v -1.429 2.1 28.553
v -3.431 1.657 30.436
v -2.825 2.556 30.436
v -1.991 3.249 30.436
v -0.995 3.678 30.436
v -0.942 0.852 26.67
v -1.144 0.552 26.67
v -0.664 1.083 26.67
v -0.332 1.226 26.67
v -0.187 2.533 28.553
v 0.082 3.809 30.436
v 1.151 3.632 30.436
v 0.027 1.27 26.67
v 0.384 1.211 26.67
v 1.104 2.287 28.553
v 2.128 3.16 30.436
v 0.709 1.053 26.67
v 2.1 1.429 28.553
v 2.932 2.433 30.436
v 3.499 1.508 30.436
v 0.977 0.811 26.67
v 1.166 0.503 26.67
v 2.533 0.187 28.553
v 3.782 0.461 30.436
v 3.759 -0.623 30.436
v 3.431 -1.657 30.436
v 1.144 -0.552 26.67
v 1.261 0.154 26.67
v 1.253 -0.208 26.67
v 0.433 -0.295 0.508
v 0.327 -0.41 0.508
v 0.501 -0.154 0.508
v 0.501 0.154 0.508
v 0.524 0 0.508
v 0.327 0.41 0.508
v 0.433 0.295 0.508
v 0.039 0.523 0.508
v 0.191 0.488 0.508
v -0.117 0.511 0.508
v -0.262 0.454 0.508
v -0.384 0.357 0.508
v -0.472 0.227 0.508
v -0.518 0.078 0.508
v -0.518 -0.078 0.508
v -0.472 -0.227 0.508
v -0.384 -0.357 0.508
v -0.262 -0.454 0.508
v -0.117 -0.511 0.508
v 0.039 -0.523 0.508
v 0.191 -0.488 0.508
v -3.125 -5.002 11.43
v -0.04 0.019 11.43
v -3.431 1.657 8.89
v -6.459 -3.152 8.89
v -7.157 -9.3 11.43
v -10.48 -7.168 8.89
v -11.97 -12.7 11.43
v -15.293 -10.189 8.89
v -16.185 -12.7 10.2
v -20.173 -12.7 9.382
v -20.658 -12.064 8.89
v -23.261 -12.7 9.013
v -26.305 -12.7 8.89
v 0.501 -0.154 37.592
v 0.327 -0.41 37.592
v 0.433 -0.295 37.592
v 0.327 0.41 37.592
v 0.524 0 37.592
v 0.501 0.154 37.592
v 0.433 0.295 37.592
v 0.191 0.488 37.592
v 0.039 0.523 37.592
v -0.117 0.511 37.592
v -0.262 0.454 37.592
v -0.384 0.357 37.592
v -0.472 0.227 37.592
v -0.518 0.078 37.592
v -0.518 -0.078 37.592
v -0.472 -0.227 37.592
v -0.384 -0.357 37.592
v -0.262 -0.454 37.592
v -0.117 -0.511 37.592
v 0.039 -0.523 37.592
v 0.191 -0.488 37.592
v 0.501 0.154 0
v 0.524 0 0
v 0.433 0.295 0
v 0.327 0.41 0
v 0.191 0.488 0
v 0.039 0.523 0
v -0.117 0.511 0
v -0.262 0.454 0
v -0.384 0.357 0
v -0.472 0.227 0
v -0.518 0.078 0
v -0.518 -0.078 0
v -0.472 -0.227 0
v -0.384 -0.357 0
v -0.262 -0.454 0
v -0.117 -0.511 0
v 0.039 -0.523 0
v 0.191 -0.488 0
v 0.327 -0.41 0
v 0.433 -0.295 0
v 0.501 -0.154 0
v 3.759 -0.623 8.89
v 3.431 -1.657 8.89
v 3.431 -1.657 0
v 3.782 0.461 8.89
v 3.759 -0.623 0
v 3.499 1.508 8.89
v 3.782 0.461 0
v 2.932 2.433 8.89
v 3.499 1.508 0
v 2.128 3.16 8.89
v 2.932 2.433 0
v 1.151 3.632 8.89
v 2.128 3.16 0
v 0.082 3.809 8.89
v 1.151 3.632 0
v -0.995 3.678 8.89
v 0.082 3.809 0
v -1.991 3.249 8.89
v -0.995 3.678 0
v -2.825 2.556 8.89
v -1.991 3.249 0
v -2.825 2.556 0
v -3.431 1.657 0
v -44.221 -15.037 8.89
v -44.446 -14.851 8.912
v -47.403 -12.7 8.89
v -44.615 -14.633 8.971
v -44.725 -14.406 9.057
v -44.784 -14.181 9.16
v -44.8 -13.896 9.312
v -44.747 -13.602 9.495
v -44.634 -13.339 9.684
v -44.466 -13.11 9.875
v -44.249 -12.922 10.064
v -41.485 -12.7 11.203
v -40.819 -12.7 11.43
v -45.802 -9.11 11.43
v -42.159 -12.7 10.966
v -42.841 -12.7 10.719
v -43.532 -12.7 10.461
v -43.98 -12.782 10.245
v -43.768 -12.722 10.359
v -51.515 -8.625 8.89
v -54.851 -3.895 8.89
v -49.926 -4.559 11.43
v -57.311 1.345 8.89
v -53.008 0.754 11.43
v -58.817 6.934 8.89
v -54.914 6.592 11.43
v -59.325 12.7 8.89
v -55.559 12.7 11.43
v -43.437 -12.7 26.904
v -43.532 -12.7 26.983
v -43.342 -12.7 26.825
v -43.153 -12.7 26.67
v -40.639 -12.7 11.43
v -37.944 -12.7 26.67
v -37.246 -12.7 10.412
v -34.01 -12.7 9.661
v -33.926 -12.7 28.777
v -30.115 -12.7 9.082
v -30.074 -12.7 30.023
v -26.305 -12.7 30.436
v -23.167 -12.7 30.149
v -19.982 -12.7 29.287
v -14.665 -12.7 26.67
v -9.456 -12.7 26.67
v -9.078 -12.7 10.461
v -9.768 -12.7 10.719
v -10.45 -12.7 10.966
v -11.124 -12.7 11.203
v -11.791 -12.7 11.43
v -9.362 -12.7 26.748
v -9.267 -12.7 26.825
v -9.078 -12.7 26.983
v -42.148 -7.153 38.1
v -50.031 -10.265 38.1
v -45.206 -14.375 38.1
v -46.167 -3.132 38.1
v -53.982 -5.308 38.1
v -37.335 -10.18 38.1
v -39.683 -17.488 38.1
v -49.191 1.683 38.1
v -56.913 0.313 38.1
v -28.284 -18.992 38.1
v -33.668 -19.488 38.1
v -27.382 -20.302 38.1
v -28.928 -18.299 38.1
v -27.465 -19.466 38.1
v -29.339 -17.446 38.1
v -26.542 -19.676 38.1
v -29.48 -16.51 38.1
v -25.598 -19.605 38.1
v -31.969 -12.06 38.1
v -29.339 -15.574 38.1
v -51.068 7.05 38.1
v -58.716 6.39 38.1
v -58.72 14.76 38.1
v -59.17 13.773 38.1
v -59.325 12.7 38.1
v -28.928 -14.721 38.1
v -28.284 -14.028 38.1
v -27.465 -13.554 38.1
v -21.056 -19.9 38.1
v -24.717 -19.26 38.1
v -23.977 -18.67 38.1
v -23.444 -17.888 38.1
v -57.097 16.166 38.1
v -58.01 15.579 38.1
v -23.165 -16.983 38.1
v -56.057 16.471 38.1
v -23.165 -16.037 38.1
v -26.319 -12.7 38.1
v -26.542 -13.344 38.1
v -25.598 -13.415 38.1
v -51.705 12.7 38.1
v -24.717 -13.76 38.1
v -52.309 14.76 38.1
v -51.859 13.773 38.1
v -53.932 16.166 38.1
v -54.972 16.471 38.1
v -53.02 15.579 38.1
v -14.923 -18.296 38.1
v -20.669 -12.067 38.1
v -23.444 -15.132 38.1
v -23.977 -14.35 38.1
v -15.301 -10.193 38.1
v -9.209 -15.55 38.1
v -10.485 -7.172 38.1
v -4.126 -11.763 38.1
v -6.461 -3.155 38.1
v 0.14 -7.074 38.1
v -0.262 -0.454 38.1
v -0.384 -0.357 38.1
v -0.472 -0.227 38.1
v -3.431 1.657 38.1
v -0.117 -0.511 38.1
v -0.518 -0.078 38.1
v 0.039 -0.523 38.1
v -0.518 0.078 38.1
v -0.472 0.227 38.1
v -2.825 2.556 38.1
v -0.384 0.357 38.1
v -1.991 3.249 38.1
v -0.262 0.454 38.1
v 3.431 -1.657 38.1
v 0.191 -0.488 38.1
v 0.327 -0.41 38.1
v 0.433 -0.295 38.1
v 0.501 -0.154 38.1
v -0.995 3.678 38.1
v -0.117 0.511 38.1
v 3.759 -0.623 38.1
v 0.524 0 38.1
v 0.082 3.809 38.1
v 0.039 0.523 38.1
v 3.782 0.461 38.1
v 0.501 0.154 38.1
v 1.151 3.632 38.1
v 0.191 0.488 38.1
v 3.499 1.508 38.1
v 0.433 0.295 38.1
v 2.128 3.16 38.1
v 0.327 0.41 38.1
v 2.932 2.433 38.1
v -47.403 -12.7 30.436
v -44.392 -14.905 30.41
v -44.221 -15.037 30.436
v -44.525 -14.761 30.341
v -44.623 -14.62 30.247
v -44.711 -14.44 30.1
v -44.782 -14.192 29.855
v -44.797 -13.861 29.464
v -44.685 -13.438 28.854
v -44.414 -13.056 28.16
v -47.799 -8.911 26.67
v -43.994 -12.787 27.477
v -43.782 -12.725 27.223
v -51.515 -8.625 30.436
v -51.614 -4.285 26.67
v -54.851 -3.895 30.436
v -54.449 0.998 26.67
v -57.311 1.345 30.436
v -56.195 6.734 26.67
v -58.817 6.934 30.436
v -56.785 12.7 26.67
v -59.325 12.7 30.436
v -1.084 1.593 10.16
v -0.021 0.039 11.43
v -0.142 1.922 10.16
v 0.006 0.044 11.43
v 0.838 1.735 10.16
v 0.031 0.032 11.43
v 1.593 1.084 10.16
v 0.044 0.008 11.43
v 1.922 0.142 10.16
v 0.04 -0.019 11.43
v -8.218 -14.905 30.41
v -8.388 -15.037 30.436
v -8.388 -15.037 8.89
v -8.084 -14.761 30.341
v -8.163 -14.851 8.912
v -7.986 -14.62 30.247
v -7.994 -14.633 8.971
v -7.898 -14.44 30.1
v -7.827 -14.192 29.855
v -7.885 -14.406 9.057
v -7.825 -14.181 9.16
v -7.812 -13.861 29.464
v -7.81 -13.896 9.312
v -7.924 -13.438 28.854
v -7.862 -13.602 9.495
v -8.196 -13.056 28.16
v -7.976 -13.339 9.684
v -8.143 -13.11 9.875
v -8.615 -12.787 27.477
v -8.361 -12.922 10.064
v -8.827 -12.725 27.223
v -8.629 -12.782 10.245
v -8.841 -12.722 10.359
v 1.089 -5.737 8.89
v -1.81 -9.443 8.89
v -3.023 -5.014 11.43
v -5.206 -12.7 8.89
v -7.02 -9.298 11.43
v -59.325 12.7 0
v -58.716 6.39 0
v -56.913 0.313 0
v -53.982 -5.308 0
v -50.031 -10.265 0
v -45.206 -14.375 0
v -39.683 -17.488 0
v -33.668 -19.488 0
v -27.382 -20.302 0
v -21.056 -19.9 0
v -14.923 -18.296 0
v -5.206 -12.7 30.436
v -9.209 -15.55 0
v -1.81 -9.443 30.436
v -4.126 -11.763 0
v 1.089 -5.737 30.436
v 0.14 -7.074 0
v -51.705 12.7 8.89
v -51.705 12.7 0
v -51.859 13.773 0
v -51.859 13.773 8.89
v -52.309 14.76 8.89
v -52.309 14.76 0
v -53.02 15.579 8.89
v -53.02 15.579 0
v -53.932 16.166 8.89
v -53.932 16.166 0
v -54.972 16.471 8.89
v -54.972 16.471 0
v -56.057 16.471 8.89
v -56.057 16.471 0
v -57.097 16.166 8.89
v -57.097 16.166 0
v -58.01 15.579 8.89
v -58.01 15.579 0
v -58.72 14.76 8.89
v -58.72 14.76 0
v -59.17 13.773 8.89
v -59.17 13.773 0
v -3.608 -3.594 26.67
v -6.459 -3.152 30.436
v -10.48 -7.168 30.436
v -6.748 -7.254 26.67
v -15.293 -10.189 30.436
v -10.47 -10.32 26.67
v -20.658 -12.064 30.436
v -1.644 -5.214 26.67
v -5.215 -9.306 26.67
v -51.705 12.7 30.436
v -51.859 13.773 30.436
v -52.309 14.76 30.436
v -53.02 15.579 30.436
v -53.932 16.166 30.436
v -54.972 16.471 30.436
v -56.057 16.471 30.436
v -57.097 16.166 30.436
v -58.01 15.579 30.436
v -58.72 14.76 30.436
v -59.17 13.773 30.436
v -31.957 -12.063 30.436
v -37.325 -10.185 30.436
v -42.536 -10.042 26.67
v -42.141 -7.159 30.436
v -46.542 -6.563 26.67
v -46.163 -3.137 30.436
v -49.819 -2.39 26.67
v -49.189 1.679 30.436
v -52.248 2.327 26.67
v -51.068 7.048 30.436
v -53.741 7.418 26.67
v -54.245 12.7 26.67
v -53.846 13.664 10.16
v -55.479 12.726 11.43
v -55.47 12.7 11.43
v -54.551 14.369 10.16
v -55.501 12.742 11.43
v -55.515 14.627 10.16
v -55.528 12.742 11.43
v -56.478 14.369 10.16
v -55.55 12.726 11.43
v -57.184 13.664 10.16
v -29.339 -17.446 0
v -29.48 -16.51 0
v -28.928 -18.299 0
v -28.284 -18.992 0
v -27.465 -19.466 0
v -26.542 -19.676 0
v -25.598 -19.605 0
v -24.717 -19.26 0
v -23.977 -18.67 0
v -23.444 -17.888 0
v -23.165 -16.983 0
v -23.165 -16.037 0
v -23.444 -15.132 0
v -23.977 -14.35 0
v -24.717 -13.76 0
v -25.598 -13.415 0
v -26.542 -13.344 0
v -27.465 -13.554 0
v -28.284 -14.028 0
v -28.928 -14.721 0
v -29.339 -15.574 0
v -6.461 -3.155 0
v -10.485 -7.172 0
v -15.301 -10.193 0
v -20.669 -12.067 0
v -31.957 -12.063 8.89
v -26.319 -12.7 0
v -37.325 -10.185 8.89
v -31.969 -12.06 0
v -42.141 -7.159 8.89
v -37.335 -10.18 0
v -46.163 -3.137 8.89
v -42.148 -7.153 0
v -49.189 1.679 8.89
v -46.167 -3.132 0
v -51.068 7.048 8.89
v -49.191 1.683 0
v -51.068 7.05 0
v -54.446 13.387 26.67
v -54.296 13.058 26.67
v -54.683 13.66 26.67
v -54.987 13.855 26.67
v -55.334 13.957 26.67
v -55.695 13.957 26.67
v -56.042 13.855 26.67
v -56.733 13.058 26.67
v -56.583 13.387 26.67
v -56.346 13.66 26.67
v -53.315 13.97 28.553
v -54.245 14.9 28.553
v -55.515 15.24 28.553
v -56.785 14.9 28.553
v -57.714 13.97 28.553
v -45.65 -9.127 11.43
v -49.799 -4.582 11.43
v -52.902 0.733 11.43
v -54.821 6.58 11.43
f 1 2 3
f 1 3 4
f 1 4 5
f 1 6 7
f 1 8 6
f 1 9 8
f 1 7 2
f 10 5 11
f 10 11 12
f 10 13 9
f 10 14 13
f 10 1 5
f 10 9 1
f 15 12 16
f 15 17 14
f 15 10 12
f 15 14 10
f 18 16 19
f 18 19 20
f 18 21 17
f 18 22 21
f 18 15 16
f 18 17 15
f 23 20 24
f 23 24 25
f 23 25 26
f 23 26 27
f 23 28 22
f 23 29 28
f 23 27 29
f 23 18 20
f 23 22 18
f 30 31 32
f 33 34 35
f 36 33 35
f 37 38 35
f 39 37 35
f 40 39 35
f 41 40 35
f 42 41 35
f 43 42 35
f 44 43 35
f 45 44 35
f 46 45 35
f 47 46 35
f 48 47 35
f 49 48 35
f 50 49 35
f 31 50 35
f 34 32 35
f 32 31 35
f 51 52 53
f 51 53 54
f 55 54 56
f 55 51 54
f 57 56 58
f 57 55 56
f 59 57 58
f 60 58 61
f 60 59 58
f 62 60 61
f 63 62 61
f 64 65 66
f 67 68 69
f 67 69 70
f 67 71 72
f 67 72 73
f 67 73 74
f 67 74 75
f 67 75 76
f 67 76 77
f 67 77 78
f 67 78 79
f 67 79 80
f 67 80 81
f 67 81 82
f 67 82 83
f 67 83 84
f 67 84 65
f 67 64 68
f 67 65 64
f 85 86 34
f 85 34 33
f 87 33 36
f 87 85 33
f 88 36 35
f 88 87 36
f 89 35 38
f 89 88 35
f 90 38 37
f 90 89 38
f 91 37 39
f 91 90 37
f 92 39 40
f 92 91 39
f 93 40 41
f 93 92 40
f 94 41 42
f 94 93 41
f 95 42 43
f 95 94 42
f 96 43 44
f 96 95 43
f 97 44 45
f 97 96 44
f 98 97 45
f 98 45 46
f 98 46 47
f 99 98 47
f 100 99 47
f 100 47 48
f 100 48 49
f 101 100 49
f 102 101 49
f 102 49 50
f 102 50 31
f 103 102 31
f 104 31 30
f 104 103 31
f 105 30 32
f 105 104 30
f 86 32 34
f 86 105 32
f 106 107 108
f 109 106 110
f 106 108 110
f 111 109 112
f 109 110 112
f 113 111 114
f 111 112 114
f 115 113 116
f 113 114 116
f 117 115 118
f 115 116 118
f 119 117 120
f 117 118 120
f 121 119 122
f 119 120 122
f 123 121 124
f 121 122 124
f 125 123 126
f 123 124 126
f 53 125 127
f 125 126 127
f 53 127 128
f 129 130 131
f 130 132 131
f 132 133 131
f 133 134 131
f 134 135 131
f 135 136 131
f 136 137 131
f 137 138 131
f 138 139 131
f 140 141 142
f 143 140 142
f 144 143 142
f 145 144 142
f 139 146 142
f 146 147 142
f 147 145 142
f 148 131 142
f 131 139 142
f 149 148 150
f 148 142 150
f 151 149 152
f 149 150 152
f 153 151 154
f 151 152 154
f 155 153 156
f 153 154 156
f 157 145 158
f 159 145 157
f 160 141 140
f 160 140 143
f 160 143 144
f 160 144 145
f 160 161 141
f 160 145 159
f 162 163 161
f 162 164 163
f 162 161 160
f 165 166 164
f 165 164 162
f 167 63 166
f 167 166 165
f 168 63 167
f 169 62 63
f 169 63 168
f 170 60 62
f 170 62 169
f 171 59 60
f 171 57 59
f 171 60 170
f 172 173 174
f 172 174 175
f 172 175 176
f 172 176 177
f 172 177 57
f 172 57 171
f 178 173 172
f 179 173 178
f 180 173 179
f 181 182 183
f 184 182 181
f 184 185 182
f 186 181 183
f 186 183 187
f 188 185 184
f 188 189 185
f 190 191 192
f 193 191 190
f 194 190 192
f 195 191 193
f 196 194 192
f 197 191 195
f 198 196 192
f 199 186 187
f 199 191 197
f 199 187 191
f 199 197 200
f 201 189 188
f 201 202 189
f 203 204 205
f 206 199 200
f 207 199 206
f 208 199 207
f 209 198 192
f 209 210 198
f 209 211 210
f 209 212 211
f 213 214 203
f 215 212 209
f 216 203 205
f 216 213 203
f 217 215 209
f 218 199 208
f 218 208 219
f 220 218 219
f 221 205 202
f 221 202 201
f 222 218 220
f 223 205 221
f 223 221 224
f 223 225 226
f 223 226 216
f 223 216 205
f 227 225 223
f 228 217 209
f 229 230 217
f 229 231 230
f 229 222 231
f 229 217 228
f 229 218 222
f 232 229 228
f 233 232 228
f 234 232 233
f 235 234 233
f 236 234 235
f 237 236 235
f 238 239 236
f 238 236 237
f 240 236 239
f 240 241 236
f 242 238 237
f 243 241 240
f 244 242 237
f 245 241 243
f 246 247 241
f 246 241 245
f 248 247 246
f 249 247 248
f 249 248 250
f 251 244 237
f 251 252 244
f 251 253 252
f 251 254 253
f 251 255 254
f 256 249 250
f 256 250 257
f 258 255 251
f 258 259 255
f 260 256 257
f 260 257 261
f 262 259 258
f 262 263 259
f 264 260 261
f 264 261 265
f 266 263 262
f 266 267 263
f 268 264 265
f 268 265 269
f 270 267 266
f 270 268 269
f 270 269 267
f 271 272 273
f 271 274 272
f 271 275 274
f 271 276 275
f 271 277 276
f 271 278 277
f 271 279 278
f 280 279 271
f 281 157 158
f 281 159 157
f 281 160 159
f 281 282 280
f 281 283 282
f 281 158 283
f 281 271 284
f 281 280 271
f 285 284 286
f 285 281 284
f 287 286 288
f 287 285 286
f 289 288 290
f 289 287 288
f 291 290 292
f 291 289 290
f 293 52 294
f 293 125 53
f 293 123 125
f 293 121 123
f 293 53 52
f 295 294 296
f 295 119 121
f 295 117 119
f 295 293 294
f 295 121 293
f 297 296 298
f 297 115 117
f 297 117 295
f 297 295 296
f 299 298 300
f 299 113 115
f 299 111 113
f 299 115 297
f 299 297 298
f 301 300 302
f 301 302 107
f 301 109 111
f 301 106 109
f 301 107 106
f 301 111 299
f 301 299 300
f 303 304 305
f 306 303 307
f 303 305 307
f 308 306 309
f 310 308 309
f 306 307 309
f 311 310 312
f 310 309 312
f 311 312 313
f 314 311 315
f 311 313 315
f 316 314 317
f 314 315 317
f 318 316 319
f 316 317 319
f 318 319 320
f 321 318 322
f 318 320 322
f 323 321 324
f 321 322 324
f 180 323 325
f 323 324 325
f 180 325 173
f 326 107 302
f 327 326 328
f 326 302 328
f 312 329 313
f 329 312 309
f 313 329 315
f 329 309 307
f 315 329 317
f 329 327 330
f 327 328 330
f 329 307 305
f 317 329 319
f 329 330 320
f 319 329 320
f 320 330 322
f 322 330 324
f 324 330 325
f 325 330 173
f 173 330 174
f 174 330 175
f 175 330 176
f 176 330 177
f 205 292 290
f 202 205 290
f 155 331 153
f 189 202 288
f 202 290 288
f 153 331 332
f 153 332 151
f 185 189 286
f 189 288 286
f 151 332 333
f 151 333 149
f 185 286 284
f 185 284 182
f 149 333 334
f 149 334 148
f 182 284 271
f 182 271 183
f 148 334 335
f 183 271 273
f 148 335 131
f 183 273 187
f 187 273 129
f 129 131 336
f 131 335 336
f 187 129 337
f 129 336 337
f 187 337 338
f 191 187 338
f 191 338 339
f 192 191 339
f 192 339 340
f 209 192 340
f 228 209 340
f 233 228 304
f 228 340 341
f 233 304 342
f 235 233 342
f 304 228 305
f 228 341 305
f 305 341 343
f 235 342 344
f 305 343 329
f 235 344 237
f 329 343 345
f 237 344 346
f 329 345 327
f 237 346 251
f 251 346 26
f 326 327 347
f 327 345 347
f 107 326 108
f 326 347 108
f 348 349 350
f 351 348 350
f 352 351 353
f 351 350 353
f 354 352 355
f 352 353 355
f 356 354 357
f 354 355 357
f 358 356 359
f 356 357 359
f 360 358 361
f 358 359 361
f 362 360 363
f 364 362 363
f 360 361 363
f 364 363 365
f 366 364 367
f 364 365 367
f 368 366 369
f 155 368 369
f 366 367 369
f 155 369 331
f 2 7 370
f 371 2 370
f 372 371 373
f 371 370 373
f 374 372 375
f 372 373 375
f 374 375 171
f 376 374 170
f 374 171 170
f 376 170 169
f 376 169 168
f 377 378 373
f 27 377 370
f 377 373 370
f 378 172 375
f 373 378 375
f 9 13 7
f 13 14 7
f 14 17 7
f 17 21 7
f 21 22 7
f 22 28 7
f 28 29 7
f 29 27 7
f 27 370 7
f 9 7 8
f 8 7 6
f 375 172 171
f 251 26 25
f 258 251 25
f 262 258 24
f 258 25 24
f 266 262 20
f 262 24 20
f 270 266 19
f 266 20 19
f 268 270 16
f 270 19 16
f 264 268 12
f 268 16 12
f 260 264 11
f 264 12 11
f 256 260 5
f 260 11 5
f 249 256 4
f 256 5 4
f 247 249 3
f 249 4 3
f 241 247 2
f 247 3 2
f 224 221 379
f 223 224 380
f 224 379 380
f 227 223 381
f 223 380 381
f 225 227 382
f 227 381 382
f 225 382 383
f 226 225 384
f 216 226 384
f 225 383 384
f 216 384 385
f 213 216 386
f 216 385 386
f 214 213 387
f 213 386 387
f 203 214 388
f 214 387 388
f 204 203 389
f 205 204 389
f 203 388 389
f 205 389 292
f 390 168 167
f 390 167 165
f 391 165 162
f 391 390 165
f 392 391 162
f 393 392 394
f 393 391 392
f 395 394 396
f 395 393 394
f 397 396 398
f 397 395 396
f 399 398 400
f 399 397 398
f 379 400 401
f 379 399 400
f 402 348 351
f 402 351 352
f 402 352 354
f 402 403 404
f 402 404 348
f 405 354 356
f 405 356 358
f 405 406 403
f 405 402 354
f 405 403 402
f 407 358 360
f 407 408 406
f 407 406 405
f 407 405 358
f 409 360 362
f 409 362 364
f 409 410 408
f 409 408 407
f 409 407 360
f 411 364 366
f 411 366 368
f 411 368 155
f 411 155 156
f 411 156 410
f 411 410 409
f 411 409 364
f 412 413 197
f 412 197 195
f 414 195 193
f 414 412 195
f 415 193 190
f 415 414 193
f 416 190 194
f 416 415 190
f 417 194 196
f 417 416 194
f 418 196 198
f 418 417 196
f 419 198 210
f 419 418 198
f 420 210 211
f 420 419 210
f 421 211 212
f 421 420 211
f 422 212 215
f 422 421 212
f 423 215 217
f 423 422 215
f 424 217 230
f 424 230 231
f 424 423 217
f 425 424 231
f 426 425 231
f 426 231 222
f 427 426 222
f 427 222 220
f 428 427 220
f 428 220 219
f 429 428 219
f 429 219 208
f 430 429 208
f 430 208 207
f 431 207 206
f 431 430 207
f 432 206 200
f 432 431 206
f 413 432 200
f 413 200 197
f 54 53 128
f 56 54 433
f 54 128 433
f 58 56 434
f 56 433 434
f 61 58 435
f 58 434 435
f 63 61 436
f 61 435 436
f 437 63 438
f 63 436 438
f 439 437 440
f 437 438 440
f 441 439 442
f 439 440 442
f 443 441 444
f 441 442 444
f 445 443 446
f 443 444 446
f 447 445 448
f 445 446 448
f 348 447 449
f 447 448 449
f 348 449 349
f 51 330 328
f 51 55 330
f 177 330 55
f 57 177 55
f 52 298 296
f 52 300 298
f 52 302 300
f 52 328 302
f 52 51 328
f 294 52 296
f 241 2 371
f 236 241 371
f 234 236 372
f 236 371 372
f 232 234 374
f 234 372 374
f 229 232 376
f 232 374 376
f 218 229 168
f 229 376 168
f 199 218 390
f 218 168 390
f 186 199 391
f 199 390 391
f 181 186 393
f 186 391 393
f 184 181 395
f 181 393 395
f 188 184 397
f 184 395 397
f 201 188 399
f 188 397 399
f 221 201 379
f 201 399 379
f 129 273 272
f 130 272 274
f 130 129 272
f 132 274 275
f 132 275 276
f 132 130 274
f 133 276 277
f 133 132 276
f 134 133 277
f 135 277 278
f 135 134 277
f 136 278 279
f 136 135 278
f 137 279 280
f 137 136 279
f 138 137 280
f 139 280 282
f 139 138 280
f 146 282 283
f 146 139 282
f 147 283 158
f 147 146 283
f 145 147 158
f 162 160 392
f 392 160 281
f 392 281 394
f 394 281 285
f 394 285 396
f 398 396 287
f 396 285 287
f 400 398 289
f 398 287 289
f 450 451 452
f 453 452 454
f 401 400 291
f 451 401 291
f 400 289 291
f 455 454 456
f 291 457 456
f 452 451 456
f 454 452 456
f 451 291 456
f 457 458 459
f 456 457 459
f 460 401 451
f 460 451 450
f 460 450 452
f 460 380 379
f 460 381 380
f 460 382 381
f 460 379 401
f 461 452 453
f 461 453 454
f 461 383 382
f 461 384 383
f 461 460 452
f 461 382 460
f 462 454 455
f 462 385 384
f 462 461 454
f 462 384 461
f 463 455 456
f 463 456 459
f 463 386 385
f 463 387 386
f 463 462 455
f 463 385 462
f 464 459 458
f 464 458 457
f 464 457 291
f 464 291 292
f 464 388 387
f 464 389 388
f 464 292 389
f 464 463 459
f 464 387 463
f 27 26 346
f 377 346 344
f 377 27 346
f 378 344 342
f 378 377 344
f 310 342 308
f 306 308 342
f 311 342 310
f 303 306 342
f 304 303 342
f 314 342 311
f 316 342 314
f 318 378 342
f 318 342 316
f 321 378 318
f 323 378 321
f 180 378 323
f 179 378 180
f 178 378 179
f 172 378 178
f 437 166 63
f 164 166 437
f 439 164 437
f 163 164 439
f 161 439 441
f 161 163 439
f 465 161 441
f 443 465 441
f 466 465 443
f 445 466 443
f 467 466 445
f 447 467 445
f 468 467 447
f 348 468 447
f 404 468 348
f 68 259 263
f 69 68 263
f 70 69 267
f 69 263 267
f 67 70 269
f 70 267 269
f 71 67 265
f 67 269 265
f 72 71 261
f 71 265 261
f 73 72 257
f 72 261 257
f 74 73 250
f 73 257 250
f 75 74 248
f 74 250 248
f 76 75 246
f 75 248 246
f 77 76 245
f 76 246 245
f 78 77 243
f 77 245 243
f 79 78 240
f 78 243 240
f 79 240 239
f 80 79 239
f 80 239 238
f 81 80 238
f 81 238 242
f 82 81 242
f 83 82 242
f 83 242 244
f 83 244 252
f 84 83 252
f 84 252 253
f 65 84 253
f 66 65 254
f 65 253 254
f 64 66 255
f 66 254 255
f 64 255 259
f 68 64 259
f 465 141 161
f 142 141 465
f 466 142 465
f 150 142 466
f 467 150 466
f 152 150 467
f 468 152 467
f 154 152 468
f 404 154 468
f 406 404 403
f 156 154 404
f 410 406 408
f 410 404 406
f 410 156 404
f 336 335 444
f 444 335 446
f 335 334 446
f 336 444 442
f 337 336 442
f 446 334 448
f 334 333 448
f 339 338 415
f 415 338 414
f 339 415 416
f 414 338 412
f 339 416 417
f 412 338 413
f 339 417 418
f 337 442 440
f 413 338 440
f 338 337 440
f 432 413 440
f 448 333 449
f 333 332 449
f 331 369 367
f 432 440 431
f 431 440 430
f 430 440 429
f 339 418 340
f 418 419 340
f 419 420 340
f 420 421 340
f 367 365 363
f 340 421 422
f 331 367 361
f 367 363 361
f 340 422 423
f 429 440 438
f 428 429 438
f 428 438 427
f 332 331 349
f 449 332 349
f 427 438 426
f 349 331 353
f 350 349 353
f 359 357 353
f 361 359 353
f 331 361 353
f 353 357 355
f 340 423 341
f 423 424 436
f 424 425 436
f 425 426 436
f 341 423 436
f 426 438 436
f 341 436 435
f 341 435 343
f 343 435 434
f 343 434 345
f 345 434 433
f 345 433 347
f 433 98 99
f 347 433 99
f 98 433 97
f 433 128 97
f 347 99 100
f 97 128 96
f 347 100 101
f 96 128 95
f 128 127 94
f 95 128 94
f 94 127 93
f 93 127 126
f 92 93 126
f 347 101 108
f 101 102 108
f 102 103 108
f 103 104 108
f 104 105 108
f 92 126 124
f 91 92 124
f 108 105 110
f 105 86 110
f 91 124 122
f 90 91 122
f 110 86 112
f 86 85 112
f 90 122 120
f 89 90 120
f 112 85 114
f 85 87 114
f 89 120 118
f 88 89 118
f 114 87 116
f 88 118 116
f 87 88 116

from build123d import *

# Parameters (mm, degrees)
SKETCH1_R               = 3.175
BOSS_EXTRUDE1_DEPTH     = 38.1
SKETCH2_R               = 0.524148551
CUT_EXTRUDE1_DEPTH      = 0.508
CUT_EXTRUDE2_DEPTH      = 74.375236584
CUT_EXTRUDE2_DEPTH_BACK = 74.375236584
SKETCH4_W               = 15.24
SKETCH4_H               = 29.21
CHAMFER1_SIZE           = 3.76570486
CHAMFER1_SIZE_2         = 2.54
FILLET1_R               = 1.27


with BuildPart() as part:
    # Sketch1 → Boss-Extrude1 (new body)
    with BuildSketch(Plane.XY):
        with BuildLine():
            ThreePointArc((3.431040036, -1.656521739), (1.656521739, 3.431040036), (-3.431040036, 1.656521739))
            ThreePointArc((-3.431040036, 1.656521739), (-31.969026999, -12.060345778), (-51.704640275, 12.7))
            ThreePointArc((-51.704640275, 12.7), (-55.514640275, 16.51), (-59.324640275, 12.7))
            ThreePointArc((-59.324640275, 12.7), (-33.668343017, -19.488449511), (3.431040036, -1.656521739))
        make_face()
        with Locations(Location((-26.304640275, -16.51, 0), (0, 0, 180))):
            Circle(SKETCH1_R, mode=Mode.SUBTRACT)
    extrude(amount=BOSS_EXTRUDE1_DEPTH)

    # Sketch2 → Cut-Extrude1 (cut)
    with BuildSketch(Plane.XY.offset(38.1)):
        Circle(SKETCH2_R)
    cut_extrude1 = extrude(amount=-CUT_EXTRUDE1_DEPTH, mode=Mode.SUBTRACT)

    # Mirror1: Cut-Extrude1 across plane
    add(cut_extrude1.mirror(Plane.XY.offset(19.05)), mode=Mode.SUBTRACT)

    # Sketch4 → Cut-Extrude2 (cut, two sides: drawn at the far end of the back side and taken through both)
    with BuildSketch(Plane(origin=(0, 0, 0), x_dir=(0, 0, -1), z_dir=(1, 0, 0)).offset(-CUT_EXTRUDE2_DEPTH_BACK)):
        with Locations((-19.05, 1.905)):
            Rectangle(SKETCH4_W, SKETCH4_H)
    extrude(amount=CUT_EXTRUDE2_DEPTH + CUT_EXTRUDE2_DEPTH_BACK, mode=Mode.SUBTRACT)

    # Chamfer1
    # the kernel refuses this chamfer: 3.76570486, 2.54 mm, written as the material it takes off along each edge
    with BuildSketch(Plane(origin=(-26.304640275, 12.7, 26.67), x_dir=(0.9005354424873034, -0.43478260869565205, 0), z_dir=(0.43478260869565205, 0.9005354424873034, 0))) as chamfer1_piece_1_section:
        Polygon((25.4, -CHAMFER1_SIZE), (25.4 + CHAMFER1_SIZE_2, 0), (25.4, 0), align=None)
    chamfer1_piece_1 = revolve(axis=Axis((-26.304640275, 12.7, 26.67), (0, 0, -1)), revolution_arc=64.228538259, mode=Mode.PRIVATE)
    chamfer1_piece_1 = split(chamfer1_piece_1, bisect_by=Plane(origin=(-26.304640275, -12.7, 26.67), z_dir=(0, 1, 0)), keep=Keep.TOP, mode=Mode.PRIVATE)
    add(chamfer1_piece_1, mode=Mode.SUBTRACT)
    with BuildSketch(Plane(origin=(-26.304640275, 12.7, 26.67), x_dir=(0.9005354424873037, -0.43478260869565155, 0), z_dir=(0.43478260869565155, 0.9005354424873037, 0))) as chamfer1_piece_2_section:
        Polygon((33.02, -CHAMFER1_SIZE), (33.02 - CHAMFER1_SIZE_2, 0), (33.02, 0), align=None)
    chamfer1_piece_2 = revolve(axis=Axis((-26.304640275, 12.7, 26.67), (0, 0, -1)), revolution_arc=41.395045941, mode=Mode.PRIVATE)
    chamfer1_piece_2 = split(chamfer1_piece_2, bisect_by=Plane(origin=(-26.304640275, -12.7, 26.67), z_dir=(0, 1, 0)), keep=Keep.TOP, mode=Mode.PRIVATE)
    add(chamfer1_piece_2, mode=Mode.SUBTRACT)
    with BuildSketch(Plane(origin=(0, 0, 26.67), x_dir=(-0.9005354424873006, 0.4347826086956581, 0), z_dir=(-0.4347826086956581, -0.9005354424873006, 0))) as chamfer1_piece_3:
        Polygon((3.81, -CHAMFER1_SIZE), (3.81 - CHAMFER1_SIZE_2, 0), (3.81, 0), align=None)
    revolve(axis=Axis((0, 0, 26.67), (0, 0, -1)), revolution_arc=180, mode=Mode.SUBTRACT)
    with BuildSketch(Plane(origin=(-26.304640275, 12.7, 26.67), x_dir=(0, -1, 0), z_dir=(1, 0, 0))) as chamfer1_piece_4_section:
        Polygon((25.4 + CHAMFER1_SIZE_2, 0), (25.4, -CHAMFER1_SIZE), (25.4, 0), align=None)
    chamfer1_piece_4 = revolve(axis=Axis((-26.304640275, 12.7, 26.67), (0, 0, -1)), revolution_arc=90, mode=Mode.PRIVATE)
    chamfer1_piece_4 = split(chamfer1_piece_4, bisect_by=Plane(origin=(-26.304640275, -12.7, 26.67), z_dir=(0, 1, 0)), keep=Keep.TOP, mode=Mode.PRIVATE)
    add(chamfer1_piece_4, mode=Mode.SUBTRACT)
    with BuildSketch(Plane(origin=(-55.514640275, 12.7, 26.67), x_dir=(1, 0, 0), z_dir=(0, -1, 0))) as chamfer1_piece_5:
        Polygon((3.81 - CHAMFER1_SIZE_2, 0), (3.81, CHAMFER1_SIZE), (3.81, 0), align=None)
    revolve(axis=Axis((-55.514640275, 12.7, 26.67), (0, 0, 1)), revolution_arc=180, mode=Mode.SUBTRACT)
    with BuildSketch(Plane(origin=(-26.304640275, 12.7, 26.67), x_dir=(-0.38802844135428005, -0.9216473993345654, 0), z_dir=(0.9216473993345654, -0.38802844135428005, 0))) as chamfer1_piece_6_section:
        Polygon((33.02, -CHAMFER1_SIZE), (33.02 - CHAMFER1_SIZE_2, 0), (33.02, 0), align=None)
    chamfer1_piece_6 = revolve(axis=Axis((-26.304640275, 12.7, 26.67), (0, 0, -1)), revolution_arc=67.168121234, mode=Mode.PRIVATE)
    chamfer1_piece_6 = split(chamfer1_piece_6, bisect_by=Plane(origin=(-26.304640275, -12.7, 26.67), z_dir=(0, 1, 0)), keep=Keep.TOP, mode=Mode.PRIVATE)
    add(chamfer1_piece_6, mode=Mode.SUBTRACT)
    with BuildSketch(Plane(origin=(-26.304640275, 12.7, 11.43), x_dir=(0.9005354424873034, -0.43478260869565205, 0), z_dir=(0.43478260869565205, 0.9005354424873034, 0))) as chamfer1_piece_7_section:
        Polygon((25.4, CHAMFER1_SIZE_2), (25.4 + CHAMFER1_SIZE, 0), (25.4, 0), align=None)
    chamfer1_piece_7 = revolve(axis=Axis((-26.304640275, 12.7, 11.43), (0, 0, -1)), revolution_arc=64.228538259, mode=Mode.PRIVATE)
    chamfer1_piece_7 = split(chamfer1_piece_7, bisect_by=Plane(origin=(-26.304640275, -12.7, 11.43), z_dir=(0, 1, 0)), keep=Keep.TOP, mode=Mode.PRIVATE)
    add(chamfer1_piece_7, mode=Mode.SUBTRACT)
    with BuildSketch(Plane(origin=(-26.304640275, 12.7, 11.43), x_dir=(0, -1, 0), z_dir=(1, 0, 0))) as chamfer1_piece_8_section:
        Polygon((25.4, CHAMFER1_SIZE_2), (25.4 + CHAMFER1_SIZE, 0), (25.4, 0), align=None)
    chamfer1_piece_8 = revolve(axis=Axis((-26.304640275, 12.7, 11.43), (0, 0, -1)), revolution_arc=90, mode=Mode.PRIVATE)
    chamfer1_piece_8 = split(chamfer1_piece_8, bisect_by=Plane(origin=(-26.304640275, -12.7, 11.43), z_dir=(0, 1, 0)), keep=Keep.TOP, mode=Mode.PRIVATE)
    add(chamfer1_piece_8, mode=Mode.SUBTRACT)
    with BuildSketch(Plane(origin=(-26.304640275, 12.7, 11.43), x_dir=(-0.38802844135427855, -0.9216473993345662, 0), z_dir=(0.9216473993345662, -0.38802844135427855, 0))) as chamfer1_piece_9_section:
        Polygon((33.02, CHAMFER1_SIZE_2), (33.02 - CHAMFER1_SIZE, 0), (33.02, 0), align=None)
    chamfer1_piece_9 = revolve(axis=Axis((-26.304640275, 12.7, 11.43), (0, 0, -1)), revolution_arc=67.168121234, mode=Mode.PRIVATE)
    chamfer1_piece_9 = split(chamfer1_piece_9, bisect_by=Plane(origin=(-26.304640275, -12.7, 11.43), z_dir=(0, 1, 0)), keep=Keep.TOP, mode=Mode.PRIVATE)
    add(chamfer1_piece_9, mode=Mode.SUBTRACT)
    with BuildSketch(Plane(origin=(-26.304640275, 12.7, 11.43), x_dir=(0.9005354424873037, -0.43478260869565155, 0), z_dir=(0.43478260869565155, 0.9005354424873037, 0))) as chamfer1_piece_10_section:
        Polygon((33.02, CHAMFER1_SIZE_2), (33.02 - CHAMFER1_SIZE, 0), (33.02, 0), align=None)
    chamfer1_piece_10 = revolve(axis=Axis((-26.304640275, 12.7, 11.43), (0, 0, -1)), revolution_arc=41.395045941, mode=Mode.PRIVATE)
    chamfer1_piece_10 = split(chamfer1_piece_10, bisect_by=Plane(origin=(-26.304640275, -12.7, 11.43), z_dir=(0, 1, 0)), keep=Keep.TOP, mode=Mode.PRIVATE)
    add(chamfer1_piece_10, mode=Mode.SUBTRACT)
    with BuildSketch(Plane(origin=(-55.514640275, 12.7, 11.43), x_dir=(1, 0, 0), z_dir=(0, -1, 0))) as chamfer1_piece_11:
        Polygon((3.81, -CHAMFER1_SIZE_2), (3.81 - CHAMFER1_SIZE, 0), (3.81, 0), align=None)
    revolve(axis=Axis((-55.514640275, 12.7, 11.43), (0, 0, 1)), revolution_arc=180, mode=Mode.SUBTRACT)
    with BuildSketch(Plane(origin=(0, 0, 11.43), x_dir=(-0.9005354424873006, 0.4347826086956581, 0), z_dir=(-0.4347826086956581, -0.9005354424873006, 0))) as chamfer1_piece_12:
        Polygon((3.81 - CHAMFER1_SIZE, 0), (3.81, CHAMFER1_SIZE_2), (3.81, 0), align=None)
    revolve(axis=Axis((0, 0, 11.43), (0, 0, -1)), revolution_arc=180, mode=Mode.SUBTRACT)

    # Fillet1
    fillet1_edges = [part.edges().sort_by_distance(p)[0] for p in [
        (-5.205815663, -12.7, 19.66285243),
        (-47.403464887, -12.7, 19.66285243),
    ]]
    fillet(fillet1_edges, radius=FILLET1_R)


solid = part.part
